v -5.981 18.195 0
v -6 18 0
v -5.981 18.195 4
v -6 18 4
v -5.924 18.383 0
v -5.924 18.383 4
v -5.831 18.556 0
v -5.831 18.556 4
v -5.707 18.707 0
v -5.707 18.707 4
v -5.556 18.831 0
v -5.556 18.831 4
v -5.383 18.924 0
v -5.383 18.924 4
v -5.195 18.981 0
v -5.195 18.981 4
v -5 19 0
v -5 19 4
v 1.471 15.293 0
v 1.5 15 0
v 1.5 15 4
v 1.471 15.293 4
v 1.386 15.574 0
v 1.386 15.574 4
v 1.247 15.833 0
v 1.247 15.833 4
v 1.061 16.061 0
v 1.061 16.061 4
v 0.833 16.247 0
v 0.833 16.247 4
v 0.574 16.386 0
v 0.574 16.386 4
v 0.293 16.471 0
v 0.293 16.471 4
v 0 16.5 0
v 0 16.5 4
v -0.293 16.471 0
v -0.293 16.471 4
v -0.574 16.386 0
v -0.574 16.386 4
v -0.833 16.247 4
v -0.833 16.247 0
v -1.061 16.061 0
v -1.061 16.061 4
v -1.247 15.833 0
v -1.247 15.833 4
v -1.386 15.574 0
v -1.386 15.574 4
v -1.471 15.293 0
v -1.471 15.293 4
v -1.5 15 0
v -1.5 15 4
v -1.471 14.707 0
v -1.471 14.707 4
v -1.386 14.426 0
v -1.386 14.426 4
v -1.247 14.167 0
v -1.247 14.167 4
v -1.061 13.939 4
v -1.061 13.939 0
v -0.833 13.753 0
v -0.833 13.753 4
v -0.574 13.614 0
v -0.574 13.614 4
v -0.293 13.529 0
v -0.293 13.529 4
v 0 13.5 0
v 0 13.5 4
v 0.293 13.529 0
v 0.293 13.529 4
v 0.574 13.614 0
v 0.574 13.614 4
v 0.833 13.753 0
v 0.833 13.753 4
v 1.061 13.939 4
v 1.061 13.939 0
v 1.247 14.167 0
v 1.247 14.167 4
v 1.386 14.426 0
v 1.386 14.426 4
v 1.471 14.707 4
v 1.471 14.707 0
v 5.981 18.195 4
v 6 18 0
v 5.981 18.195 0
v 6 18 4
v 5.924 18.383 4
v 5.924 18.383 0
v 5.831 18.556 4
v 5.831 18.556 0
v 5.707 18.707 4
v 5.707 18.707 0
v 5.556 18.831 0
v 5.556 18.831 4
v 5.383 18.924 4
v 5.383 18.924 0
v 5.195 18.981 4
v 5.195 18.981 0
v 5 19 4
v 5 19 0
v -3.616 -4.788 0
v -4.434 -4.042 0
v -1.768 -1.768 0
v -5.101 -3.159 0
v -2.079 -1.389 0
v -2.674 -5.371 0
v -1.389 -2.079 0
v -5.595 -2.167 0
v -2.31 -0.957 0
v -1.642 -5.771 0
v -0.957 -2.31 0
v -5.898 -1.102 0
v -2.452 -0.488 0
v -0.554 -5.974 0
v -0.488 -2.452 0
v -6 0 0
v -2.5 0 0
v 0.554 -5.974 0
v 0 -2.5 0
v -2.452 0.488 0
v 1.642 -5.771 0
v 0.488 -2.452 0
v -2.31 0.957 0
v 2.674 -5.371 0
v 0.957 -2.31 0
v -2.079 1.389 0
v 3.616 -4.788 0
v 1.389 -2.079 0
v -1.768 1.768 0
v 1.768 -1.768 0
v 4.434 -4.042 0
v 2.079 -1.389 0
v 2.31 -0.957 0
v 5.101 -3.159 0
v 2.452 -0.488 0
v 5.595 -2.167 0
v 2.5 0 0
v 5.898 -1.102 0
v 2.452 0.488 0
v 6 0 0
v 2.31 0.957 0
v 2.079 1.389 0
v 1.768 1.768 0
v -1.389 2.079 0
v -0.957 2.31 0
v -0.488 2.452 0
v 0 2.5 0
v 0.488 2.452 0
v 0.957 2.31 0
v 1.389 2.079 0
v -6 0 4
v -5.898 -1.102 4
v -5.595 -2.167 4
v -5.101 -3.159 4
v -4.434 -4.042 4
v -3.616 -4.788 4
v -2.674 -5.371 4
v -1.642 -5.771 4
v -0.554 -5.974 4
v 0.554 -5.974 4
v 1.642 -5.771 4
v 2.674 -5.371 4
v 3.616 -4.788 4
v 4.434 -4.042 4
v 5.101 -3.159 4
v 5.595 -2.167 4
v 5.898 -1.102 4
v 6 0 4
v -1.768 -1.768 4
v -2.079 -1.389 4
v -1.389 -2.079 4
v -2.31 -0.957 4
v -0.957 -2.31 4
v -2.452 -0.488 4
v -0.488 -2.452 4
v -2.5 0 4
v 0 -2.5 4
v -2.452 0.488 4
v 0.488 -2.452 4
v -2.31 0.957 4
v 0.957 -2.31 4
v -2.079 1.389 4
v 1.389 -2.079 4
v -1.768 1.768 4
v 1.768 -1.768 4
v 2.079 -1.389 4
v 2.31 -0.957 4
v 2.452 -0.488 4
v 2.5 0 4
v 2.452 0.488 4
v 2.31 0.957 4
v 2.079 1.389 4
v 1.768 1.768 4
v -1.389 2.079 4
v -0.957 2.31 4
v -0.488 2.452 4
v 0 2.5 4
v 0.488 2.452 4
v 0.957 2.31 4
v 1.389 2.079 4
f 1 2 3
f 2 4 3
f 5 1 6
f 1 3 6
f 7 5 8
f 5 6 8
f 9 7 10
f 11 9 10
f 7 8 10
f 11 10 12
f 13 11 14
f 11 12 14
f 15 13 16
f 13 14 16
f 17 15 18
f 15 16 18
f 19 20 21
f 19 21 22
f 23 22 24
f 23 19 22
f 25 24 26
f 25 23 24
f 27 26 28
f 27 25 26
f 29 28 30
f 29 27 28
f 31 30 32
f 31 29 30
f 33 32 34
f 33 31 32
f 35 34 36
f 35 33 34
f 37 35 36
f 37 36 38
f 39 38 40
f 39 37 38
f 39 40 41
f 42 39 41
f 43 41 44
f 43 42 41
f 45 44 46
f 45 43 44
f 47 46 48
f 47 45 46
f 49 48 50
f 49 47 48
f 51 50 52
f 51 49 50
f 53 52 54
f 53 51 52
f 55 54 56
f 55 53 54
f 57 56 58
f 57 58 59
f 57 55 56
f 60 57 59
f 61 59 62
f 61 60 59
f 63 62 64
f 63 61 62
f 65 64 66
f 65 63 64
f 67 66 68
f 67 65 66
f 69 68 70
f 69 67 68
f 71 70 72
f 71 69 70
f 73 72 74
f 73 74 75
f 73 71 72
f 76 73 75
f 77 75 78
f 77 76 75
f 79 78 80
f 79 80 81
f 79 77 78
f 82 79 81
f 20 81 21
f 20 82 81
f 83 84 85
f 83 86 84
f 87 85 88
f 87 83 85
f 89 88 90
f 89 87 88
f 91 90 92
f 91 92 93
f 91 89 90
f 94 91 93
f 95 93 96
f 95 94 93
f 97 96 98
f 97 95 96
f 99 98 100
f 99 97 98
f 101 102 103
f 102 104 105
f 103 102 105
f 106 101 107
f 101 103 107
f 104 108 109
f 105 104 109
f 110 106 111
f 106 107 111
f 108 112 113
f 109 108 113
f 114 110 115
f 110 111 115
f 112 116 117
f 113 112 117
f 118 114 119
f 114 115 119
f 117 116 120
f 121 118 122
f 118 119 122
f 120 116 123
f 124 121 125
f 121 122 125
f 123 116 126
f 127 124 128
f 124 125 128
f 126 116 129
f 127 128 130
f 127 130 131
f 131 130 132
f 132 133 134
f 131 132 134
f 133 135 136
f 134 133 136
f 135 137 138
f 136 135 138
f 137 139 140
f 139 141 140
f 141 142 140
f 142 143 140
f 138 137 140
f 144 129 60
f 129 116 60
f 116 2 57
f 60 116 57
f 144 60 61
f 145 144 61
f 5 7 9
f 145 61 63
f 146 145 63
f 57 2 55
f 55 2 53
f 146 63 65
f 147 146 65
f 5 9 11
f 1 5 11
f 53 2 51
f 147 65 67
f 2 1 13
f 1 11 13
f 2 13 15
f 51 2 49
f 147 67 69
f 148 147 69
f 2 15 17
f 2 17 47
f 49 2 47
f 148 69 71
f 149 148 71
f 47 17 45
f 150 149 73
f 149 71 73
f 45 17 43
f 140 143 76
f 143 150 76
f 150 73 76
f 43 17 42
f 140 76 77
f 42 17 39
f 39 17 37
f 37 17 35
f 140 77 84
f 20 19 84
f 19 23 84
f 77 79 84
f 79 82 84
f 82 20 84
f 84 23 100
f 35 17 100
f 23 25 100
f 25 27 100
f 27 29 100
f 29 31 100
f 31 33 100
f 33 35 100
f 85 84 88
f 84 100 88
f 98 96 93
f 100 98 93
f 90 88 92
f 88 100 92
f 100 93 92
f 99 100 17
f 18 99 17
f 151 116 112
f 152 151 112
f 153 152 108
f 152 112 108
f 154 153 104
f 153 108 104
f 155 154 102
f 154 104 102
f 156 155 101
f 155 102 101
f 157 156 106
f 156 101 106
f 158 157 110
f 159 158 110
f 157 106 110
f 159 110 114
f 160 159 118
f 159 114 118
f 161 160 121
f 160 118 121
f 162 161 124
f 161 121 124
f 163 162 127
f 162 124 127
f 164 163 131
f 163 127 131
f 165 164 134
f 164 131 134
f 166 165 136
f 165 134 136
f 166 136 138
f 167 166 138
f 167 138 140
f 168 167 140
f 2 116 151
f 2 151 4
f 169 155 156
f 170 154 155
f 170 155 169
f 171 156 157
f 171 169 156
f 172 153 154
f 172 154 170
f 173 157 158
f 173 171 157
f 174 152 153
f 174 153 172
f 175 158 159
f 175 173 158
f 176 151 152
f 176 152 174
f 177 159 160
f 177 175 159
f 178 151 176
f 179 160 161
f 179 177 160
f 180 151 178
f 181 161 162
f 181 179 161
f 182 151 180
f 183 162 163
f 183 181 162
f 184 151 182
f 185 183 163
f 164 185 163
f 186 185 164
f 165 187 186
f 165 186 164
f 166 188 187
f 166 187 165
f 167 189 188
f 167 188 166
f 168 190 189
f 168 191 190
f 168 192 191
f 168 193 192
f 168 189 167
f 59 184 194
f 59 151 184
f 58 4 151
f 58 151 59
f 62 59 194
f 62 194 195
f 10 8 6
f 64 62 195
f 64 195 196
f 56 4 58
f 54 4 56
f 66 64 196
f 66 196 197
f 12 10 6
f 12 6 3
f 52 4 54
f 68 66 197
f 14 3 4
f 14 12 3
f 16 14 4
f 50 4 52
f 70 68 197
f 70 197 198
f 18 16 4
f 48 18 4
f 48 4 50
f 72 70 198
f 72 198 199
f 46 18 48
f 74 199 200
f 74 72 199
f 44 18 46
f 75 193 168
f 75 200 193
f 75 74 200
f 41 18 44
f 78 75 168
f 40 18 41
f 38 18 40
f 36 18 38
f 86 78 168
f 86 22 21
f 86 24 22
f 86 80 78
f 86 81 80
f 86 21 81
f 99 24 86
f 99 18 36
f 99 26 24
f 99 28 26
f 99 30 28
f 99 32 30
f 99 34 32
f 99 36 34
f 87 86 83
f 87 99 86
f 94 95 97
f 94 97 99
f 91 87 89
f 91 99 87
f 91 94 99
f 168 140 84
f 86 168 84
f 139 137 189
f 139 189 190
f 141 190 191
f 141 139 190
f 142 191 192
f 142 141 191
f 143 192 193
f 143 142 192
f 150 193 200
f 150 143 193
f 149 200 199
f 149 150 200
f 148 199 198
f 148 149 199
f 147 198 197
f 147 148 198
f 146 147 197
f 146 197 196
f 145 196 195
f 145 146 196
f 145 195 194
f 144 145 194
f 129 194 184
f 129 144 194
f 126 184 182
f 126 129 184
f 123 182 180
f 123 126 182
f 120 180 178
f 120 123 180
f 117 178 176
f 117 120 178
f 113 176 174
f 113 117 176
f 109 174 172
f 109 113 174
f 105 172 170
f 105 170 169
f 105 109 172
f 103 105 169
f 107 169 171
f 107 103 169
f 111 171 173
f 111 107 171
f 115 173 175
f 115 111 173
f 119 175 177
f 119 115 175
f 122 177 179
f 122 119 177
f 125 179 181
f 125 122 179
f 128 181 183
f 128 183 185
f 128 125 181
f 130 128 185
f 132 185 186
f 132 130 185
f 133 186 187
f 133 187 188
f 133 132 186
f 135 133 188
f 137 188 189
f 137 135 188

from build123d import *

# Parameters (mm, degrees)
SKETCH_R   = 2.5
SKETCH_R_2 = 1.5
PAD_DEPTH  = 4
FILLET_R   = 1


with BuildPart() as part:
    # Sketch → Pad (new body)
    with BuildSketch(Plane.XY):
        with BuildLine():
            ThreePointArc((-6, 0), (0, -6), (6, 0))
            Line((6, 0), (6, 19))
            Line((6, 19), (-6, 19))
            Line((-6, 0), (-6, 19))
        make_face()
        Circle(SKETCH_R, mode=Mode.SUBTRACT)
        with Locations((0, 15)):
            Circle(SKETCH_R_2, mode=Mode.SUBTRACT)
    extrude(amount=PAD_DEPTH)

    # Fillet
    fillet_edges = [part.edges().sort_by_distance(p)[0] for p in [
        (-6, 19, 2),
        (6, 19, 2),
    ]]
    fillet(fillet_edges, radius=FILLET_R)


solid = part.part
